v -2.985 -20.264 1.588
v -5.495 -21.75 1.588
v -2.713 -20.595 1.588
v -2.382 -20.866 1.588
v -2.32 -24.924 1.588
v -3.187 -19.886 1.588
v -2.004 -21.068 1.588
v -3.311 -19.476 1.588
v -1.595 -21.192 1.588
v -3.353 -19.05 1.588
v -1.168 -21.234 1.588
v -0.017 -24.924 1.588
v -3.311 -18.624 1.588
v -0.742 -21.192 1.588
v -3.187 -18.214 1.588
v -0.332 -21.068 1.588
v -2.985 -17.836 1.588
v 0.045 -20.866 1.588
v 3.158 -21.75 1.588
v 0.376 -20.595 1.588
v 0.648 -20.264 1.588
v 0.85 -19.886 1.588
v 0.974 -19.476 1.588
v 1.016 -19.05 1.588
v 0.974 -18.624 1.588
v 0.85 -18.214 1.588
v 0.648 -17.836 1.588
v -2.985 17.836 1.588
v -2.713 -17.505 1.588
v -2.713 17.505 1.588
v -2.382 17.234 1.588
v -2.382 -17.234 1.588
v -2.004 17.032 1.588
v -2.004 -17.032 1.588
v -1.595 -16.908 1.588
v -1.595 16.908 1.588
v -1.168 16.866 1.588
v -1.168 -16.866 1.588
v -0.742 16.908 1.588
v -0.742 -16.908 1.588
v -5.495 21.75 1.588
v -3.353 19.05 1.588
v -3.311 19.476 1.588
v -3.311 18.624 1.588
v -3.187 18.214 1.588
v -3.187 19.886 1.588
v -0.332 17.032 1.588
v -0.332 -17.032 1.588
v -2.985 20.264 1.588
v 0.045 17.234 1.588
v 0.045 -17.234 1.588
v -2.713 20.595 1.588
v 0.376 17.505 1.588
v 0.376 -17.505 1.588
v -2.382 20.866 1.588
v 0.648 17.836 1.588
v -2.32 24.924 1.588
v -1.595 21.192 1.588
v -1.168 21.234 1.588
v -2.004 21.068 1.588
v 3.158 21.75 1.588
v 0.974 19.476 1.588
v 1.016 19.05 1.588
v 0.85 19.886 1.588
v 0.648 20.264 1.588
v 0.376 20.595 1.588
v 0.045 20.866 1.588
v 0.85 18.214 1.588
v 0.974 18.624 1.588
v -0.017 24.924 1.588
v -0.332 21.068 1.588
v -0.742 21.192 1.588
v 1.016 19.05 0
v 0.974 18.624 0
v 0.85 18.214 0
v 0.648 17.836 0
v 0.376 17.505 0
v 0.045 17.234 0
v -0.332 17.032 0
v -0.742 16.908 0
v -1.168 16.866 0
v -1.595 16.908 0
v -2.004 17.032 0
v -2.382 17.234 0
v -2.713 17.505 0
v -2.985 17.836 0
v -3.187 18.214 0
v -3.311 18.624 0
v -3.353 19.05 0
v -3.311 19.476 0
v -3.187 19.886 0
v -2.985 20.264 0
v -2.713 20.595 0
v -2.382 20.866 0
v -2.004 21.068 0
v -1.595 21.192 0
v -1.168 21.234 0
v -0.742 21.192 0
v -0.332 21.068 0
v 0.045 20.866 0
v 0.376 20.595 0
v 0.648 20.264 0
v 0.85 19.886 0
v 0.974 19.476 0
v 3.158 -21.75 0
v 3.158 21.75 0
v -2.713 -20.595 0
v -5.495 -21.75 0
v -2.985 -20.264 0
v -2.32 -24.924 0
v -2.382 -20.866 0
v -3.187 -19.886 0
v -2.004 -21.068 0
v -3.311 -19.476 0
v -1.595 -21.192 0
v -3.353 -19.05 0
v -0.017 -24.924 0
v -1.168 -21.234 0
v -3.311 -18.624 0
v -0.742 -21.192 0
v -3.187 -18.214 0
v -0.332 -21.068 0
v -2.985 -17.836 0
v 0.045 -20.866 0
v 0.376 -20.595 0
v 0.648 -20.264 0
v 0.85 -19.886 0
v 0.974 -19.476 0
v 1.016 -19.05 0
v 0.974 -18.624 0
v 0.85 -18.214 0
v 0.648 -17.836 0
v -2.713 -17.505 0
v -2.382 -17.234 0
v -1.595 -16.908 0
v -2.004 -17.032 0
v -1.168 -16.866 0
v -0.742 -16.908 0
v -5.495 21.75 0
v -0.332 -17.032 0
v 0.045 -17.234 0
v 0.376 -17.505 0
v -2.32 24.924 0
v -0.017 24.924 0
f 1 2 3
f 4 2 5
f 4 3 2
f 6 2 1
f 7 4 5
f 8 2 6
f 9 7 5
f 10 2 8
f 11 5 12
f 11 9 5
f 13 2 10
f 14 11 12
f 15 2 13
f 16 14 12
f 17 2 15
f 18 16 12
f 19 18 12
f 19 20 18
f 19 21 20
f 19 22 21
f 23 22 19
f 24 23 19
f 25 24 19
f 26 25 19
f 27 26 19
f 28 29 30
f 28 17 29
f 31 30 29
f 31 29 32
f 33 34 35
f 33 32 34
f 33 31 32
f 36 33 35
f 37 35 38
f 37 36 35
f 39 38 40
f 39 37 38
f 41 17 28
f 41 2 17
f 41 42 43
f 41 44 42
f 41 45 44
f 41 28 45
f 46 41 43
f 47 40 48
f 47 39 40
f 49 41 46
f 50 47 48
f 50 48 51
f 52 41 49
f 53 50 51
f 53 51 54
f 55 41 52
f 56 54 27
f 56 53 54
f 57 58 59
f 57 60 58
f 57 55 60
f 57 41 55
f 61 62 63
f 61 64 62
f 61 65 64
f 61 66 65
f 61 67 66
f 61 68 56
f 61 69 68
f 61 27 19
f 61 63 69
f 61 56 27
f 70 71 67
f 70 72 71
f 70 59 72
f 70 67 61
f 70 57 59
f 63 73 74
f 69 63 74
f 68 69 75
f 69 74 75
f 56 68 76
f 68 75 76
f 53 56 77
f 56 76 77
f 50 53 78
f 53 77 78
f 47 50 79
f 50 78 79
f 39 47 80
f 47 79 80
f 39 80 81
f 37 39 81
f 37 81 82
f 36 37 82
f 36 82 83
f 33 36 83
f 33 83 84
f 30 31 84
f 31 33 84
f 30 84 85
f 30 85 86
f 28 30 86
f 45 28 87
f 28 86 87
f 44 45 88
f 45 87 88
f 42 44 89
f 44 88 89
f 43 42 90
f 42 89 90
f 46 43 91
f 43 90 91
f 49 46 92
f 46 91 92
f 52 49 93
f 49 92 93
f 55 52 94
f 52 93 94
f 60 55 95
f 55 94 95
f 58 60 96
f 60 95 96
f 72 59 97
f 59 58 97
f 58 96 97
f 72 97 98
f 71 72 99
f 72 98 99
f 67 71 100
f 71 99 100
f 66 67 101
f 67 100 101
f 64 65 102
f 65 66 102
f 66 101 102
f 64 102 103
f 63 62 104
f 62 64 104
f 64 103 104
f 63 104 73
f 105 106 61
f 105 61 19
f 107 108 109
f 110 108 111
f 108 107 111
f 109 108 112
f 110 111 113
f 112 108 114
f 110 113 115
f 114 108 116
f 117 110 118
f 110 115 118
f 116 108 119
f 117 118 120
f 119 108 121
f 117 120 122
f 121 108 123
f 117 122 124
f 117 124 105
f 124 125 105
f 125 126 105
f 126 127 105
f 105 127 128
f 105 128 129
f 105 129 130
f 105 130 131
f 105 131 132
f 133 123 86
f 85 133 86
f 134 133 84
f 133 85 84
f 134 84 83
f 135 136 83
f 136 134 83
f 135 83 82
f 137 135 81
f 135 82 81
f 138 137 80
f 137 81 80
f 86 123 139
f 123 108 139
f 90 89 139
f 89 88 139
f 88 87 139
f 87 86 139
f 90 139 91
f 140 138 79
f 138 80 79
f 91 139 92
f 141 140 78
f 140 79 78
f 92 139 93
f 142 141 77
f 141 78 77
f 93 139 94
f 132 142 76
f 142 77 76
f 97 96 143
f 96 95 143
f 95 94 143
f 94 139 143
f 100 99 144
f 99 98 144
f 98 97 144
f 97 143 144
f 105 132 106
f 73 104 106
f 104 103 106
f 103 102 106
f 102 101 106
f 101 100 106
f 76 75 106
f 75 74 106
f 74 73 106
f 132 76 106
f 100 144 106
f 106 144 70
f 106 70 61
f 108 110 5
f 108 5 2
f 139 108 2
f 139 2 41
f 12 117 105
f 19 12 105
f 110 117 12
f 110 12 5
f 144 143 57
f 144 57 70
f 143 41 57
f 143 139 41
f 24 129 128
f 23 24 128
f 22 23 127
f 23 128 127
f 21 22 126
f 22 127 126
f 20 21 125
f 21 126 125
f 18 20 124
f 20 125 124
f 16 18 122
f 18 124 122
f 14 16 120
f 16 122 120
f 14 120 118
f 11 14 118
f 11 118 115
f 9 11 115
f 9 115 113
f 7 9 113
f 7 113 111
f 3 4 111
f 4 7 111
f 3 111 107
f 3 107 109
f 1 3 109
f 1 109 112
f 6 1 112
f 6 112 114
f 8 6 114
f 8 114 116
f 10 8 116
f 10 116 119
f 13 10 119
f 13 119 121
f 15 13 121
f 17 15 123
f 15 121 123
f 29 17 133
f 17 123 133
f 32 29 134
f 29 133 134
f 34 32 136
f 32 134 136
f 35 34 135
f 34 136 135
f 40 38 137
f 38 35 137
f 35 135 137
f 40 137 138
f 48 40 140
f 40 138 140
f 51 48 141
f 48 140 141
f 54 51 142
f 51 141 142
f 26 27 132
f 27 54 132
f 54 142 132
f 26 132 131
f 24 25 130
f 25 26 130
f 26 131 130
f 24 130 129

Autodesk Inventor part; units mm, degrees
ref_plane "YZ Plane" through (0, 0, 0) normal (1, 0, 0) x (0, 1, 0)
ref_plane "XZ Plane" through (0, 0, 0) normal (0, 1, 0) x (-1, 0, 0)
ref_plane "XY Plane" through (0, 0, 0) normal (0, 0, 1) x (1, 0, 0)
sketch "Sketch1" plane through (0, 0, 0) normal (0, 0, 1) x (1, 0, 0)
  circle A0 centre (-1.1684, -19.05) radius 2.1844 projected
  circle A1 centre (-1.1684, 19.05) radius 2.1844 projected
  line L0 (3.9688, -24.2345) -> (3.9688, 38.1) construction
  line L1 (-0.0172, -24.9245) -> (-2.3196, -24.9245)
  line L2 (-5.4946, -21.7495) -> (-5.4946, 21.7495)
  line L3 (-2.3196, 24.9245) -> (-0.0172, 24.9245)
  line L4 (3.1578, 21.7495) -> (3.1578, -21.7495)
  line L5 (-2.3196, -24.9245) -> (-5.4946, -21.7495)
  line L6 (-0.0172, -24.9245) -> (3.1578, -21.7495)
  line L7 (-0.0172, 24.9245) -> (3.1578, 21.7495)
  line L8 (-5.4946, 21.7495) -> (-2.3196, 24.9245)
  point P0 (0, 0)
  point P1 (3.1578, -24.9245)
  point P2 (-5.4946, 24.9245)
  point P3 (-5.4946, -24.9245)
  point P4 (3.1578, 24.9245)
  dimension "d0" = 3.175
  dimension "d1" = 3.175
  dimension "d2" = 3.175
  dimension "d3" = 3.175
  dimension "d4" = 3.175
  dimension "d5" = 3.175
  dimension "d6" = 3.175
  dimension "d7" = 3.175
extrude "Extrusion1" add sketch "Sketch1" along normal blind 1.5875
equation "\"d1\" = d0"
equation "\"d2\" = d0"
equation "\"d3\" = d2"
equation "\"d4\" = d0"
equation "\"d5\" = d4"
equation "\"d6\" = d0"
equation "\"d7\" = d6"
properties part number "Endgame brake pad polycarb"
